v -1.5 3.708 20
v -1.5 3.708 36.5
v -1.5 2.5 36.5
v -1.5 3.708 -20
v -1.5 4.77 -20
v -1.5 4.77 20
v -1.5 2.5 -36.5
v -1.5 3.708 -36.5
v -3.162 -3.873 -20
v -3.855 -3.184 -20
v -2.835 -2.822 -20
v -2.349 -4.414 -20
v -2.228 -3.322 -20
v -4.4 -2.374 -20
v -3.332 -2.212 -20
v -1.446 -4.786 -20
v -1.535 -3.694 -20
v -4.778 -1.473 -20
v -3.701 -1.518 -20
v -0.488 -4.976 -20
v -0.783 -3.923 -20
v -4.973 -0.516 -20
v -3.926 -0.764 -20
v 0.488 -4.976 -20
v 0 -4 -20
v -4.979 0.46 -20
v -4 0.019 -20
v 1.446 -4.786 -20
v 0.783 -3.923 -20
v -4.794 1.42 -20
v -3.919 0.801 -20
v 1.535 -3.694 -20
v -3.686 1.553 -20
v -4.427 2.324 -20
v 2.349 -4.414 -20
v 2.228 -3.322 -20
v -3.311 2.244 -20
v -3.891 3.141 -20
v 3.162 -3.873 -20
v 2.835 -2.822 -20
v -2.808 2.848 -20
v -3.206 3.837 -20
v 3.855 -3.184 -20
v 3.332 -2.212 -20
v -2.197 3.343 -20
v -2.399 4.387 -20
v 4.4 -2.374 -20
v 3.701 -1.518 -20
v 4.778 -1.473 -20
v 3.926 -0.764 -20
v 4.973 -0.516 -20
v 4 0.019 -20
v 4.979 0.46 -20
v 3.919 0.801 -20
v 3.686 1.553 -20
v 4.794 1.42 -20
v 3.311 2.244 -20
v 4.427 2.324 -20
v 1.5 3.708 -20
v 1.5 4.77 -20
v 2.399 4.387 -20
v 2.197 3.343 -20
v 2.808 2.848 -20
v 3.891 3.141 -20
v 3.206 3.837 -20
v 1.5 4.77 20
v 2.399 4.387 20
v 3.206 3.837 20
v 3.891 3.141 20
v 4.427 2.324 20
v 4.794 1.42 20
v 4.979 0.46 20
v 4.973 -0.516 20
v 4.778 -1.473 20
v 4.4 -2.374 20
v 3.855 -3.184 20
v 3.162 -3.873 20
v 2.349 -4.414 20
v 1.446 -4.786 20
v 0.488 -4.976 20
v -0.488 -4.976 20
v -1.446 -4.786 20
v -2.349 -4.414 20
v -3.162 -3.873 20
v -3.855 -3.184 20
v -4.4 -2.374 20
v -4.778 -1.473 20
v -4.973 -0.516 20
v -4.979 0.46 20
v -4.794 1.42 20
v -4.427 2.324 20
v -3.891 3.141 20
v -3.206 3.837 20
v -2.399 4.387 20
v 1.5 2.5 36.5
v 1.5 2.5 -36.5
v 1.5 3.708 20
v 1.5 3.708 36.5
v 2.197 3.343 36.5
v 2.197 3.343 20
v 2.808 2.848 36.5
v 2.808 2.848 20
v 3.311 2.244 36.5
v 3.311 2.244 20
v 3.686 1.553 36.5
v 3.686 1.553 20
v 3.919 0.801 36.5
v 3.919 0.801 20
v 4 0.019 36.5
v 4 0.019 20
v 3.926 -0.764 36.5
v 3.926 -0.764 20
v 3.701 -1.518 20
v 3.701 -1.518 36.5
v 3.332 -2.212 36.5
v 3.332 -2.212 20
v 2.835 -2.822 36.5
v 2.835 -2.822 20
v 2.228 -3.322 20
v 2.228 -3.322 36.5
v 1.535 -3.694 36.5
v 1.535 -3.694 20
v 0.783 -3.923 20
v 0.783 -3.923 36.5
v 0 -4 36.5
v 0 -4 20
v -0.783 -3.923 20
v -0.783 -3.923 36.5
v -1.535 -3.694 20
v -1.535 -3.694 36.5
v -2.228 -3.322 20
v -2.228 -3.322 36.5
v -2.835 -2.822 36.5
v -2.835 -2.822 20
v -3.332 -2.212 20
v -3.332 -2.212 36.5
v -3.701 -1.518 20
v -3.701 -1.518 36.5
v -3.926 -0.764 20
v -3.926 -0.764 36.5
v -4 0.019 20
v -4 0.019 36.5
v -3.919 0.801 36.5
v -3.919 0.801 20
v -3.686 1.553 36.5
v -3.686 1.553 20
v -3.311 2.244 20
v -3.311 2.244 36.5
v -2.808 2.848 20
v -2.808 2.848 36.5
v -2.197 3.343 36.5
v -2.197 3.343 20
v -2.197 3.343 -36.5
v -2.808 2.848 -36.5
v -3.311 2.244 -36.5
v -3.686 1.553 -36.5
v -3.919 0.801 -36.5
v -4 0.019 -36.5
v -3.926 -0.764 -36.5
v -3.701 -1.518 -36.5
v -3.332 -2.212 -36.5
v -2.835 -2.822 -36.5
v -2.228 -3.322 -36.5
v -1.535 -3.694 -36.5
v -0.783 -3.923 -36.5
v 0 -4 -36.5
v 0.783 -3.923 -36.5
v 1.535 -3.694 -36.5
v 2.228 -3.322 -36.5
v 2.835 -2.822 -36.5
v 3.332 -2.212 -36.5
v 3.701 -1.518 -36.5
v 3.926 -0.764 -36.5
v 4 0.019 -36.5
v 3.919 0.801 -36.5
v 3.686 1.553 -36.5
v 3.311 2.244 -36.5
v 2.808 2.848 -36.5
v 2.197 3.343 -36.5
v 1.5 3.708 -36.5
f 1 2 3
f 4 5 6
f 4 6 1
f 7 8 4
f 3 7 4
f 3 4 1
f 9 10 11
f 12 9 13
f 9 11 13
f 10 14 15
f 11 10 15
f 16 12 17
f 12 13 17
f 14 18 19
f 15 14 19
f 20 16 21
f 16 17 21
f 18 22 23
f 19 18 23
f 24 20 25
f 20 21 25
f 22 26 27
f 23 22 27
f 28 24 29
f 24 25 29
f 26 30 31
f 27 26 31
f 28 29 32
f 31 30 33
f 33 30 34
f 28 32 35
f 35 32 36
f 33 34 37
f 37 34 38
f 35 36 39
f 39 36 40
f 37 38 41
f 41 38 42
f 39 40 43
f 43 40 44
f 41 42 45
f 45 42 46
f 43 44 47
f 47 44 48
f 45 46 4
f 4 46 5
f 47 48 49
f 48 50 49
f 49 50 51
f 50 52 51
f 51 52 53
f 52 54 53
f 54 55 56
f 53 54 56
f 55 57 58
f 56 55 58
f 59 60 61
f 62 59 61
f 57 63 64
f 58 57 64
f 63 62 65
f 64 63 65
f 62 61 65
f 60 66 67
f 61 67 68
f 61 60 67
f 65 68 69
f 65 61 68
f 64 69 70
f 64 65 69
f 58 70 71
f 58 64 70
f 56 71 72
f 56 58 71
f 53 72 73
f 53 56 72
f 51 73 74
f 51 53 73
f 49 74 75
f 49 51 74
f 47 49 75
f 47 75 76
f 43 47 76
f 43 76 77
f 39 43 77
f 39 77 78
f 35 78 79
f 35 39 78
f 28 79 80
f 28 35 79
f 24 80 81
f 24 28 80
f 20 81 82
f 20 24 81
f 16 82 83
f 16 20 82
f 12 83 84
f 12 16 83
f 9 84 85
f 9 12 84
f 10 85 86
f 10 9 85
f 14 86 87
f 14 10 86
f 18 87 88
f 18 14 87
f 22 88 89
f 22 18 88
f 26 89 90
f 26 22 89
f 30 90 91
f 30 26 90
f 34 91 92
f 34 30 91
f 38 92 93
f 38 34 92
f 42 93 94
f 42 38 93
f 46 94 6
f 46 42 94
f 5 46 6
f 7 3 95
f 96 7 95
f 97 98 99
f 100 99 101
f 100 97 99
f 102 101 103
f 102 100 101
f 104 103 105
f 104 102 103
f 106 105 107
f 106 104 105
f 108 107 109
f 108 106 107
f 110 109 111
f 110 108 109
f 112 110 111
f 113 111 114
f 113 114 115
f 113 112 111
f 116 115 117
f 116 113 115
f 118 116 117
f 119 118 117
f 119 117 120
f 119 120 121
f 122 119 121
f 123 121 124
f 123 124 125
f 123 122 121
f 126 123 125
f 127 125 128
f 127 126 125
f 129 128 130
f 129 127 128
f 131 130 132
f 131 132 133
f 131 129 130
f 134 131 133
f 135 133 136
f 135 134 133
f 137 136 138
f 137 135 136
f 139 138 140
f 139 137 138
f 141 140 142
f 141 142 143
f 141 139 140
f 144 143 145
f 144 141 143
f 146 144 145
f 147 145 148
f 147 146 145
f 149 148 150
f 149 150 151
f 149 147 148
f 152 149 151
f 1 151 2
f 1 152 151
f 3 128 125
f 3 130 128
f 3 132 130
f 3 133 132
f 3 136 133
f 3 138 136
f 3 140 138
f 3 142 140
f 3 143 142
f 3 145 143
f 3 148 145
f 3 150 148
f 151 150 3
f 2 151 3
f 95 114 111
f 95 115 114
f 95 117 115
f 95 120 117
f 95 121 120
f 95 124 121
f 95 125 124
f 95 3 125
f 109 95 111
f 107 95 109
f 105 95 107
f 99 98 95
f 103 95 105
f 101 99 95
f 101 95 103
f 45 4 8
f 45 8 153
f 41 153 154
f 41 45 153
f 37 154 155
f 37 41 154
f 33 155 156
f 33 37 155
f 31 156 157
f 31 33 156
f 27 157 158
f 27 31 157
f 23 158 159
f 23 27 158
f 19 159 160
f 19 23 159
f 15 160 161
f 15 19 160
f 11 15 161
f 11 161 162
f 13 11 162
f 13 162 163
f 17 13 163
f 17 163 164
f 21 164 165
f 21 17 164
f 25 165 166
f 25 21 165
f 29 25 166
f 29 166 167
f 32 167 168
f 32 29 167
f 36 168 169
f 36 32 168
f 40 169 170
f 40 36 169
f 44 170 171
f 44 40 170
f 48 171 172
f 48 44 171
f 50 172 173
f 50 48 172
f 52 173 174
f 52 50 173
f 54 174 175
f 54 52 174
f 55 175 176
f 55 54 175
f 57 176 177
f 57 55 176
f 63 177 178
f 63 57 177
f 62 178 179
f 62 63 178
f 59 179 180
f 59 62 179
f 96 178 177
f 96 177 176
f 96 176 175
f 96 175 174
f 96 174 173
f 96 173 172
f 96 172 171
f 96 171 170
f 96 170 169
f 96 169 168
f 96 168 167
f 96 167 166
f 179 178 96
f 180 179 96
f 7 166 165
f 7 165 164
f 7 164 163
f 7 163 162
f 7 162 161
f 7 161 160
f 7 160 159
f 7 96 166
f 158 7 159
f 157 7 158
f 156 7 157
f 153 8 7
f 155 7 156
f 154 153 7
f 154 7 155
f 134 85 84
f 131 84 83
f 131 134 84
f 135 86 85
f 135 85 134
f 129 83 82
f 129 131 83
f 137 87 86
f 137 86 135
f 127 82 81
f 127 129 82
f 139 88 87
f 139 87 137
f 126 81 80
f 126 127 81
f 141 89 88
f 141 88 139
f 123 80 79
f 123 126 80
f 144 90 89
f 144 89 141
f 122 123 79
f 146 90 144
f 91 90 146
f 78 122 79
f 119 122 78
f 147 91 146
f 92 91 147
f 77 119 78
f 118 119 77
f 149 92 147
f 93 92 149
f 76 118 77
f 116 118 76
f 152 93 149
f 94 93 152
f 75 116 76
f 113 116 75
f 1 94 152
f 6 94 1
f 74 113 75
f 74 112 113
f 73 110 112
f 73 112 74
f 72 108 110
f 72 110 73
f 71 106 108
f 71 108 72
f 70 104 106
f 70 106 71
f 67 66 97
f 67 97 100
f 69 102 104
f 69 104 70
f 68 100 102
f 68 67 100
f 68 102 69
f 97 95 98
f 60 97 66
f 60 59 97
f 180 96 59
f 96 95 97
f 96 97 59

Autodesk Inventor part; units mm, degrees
ref_plane "YZ Plane" through (0, 0, 0) normal (1, 0, 0) x (0, 1, 0)
ref_plane "XZ Plane" through (0, 0, 0) normal (0, 1, 0) x (-1, 0, 0)
ref_plane "XY Plane" through (0, 0, 0) normal (0, 0, 1) x (1, 0, 0)
sketch "Sketch1" plane through (0, 0, 0) normal (0, 0, 1) x (1, 0, 0)
  circle A0 centre (0, 0) radius 5
  dimension "d0" = 10
extrude "Extrusion1" add sketch "Sketch1" along normal mid plane 40
sketch "Sketch2" plane through (0, 0, 20) normal (0, 0, 1) x (1, 0, 0)
  circle A0 centre (0, 0) radius 4
  line L0 (-2.6458, 3) -> (2.6458, 3)
  line L1 (1.5, 2.5) -> (1.5, 5.5)
  line L2 (1.5, 5.5) -> (-1.5, 5.5)
  line L3 (-1.5, 5.5) -> (-1.5, 2.5)
  line L4 (-1.5, 2.5) -> (1.5, 2.5)
  line L5 (1.5, 2.5) -> (-1.5, 5.5) construction
  line L6 (1.5, 5.5) -> (-1.5, 2.5) construction
  line L7 (0, -7.1) -> (0, 7.6) projected
  point P0 (0, 4)
  point P1 (0, 4)
  point P2 (-1.5, 3.7081)
  point P3 (1.5, 3.7081)
  dimension "d3" = 8
  dimension "d4" = 3
  dimension "d11" = 3
  dimension "d12" = 3
extrude "Extrusion2" add sketch "Sketch2" along normal blind 16.5 contours A0 L7 L4 L1 L0 | L0 L1 A0 | A0 L0 L3 L4 L7 | L1 L0 L7 A0 | L1 L4 L7 L0 | A0 L3 L0 | L4 L3 L0 L7 | L7 L0 L3 A0
thread "Thread1" size "M8x1.25" class "6g" standard "ANSI Metric M Profile" length 12.5 offset 4
mirror "Mirror2" about plane through (0, 0, 0) normal (0, 0, 1) of "Extrusion2"
thread "Thread2" size "M8x1.25" class "6g" standard "ANSI Metric M Profile" length 12.5 offset 4
extrude "Extrusion3" cut sketch "Sketch2" along normal through all both and the other way through all contours L1 L0 L7 A0 | A0 L7 L2 L1 | L1 L4 L7 L0 | L4 L3 L0 L7 | L7 L0 L3 A0 | A0 L3 L2 L7
properties part number "HornGearShaft" material "Stainless Steel"
